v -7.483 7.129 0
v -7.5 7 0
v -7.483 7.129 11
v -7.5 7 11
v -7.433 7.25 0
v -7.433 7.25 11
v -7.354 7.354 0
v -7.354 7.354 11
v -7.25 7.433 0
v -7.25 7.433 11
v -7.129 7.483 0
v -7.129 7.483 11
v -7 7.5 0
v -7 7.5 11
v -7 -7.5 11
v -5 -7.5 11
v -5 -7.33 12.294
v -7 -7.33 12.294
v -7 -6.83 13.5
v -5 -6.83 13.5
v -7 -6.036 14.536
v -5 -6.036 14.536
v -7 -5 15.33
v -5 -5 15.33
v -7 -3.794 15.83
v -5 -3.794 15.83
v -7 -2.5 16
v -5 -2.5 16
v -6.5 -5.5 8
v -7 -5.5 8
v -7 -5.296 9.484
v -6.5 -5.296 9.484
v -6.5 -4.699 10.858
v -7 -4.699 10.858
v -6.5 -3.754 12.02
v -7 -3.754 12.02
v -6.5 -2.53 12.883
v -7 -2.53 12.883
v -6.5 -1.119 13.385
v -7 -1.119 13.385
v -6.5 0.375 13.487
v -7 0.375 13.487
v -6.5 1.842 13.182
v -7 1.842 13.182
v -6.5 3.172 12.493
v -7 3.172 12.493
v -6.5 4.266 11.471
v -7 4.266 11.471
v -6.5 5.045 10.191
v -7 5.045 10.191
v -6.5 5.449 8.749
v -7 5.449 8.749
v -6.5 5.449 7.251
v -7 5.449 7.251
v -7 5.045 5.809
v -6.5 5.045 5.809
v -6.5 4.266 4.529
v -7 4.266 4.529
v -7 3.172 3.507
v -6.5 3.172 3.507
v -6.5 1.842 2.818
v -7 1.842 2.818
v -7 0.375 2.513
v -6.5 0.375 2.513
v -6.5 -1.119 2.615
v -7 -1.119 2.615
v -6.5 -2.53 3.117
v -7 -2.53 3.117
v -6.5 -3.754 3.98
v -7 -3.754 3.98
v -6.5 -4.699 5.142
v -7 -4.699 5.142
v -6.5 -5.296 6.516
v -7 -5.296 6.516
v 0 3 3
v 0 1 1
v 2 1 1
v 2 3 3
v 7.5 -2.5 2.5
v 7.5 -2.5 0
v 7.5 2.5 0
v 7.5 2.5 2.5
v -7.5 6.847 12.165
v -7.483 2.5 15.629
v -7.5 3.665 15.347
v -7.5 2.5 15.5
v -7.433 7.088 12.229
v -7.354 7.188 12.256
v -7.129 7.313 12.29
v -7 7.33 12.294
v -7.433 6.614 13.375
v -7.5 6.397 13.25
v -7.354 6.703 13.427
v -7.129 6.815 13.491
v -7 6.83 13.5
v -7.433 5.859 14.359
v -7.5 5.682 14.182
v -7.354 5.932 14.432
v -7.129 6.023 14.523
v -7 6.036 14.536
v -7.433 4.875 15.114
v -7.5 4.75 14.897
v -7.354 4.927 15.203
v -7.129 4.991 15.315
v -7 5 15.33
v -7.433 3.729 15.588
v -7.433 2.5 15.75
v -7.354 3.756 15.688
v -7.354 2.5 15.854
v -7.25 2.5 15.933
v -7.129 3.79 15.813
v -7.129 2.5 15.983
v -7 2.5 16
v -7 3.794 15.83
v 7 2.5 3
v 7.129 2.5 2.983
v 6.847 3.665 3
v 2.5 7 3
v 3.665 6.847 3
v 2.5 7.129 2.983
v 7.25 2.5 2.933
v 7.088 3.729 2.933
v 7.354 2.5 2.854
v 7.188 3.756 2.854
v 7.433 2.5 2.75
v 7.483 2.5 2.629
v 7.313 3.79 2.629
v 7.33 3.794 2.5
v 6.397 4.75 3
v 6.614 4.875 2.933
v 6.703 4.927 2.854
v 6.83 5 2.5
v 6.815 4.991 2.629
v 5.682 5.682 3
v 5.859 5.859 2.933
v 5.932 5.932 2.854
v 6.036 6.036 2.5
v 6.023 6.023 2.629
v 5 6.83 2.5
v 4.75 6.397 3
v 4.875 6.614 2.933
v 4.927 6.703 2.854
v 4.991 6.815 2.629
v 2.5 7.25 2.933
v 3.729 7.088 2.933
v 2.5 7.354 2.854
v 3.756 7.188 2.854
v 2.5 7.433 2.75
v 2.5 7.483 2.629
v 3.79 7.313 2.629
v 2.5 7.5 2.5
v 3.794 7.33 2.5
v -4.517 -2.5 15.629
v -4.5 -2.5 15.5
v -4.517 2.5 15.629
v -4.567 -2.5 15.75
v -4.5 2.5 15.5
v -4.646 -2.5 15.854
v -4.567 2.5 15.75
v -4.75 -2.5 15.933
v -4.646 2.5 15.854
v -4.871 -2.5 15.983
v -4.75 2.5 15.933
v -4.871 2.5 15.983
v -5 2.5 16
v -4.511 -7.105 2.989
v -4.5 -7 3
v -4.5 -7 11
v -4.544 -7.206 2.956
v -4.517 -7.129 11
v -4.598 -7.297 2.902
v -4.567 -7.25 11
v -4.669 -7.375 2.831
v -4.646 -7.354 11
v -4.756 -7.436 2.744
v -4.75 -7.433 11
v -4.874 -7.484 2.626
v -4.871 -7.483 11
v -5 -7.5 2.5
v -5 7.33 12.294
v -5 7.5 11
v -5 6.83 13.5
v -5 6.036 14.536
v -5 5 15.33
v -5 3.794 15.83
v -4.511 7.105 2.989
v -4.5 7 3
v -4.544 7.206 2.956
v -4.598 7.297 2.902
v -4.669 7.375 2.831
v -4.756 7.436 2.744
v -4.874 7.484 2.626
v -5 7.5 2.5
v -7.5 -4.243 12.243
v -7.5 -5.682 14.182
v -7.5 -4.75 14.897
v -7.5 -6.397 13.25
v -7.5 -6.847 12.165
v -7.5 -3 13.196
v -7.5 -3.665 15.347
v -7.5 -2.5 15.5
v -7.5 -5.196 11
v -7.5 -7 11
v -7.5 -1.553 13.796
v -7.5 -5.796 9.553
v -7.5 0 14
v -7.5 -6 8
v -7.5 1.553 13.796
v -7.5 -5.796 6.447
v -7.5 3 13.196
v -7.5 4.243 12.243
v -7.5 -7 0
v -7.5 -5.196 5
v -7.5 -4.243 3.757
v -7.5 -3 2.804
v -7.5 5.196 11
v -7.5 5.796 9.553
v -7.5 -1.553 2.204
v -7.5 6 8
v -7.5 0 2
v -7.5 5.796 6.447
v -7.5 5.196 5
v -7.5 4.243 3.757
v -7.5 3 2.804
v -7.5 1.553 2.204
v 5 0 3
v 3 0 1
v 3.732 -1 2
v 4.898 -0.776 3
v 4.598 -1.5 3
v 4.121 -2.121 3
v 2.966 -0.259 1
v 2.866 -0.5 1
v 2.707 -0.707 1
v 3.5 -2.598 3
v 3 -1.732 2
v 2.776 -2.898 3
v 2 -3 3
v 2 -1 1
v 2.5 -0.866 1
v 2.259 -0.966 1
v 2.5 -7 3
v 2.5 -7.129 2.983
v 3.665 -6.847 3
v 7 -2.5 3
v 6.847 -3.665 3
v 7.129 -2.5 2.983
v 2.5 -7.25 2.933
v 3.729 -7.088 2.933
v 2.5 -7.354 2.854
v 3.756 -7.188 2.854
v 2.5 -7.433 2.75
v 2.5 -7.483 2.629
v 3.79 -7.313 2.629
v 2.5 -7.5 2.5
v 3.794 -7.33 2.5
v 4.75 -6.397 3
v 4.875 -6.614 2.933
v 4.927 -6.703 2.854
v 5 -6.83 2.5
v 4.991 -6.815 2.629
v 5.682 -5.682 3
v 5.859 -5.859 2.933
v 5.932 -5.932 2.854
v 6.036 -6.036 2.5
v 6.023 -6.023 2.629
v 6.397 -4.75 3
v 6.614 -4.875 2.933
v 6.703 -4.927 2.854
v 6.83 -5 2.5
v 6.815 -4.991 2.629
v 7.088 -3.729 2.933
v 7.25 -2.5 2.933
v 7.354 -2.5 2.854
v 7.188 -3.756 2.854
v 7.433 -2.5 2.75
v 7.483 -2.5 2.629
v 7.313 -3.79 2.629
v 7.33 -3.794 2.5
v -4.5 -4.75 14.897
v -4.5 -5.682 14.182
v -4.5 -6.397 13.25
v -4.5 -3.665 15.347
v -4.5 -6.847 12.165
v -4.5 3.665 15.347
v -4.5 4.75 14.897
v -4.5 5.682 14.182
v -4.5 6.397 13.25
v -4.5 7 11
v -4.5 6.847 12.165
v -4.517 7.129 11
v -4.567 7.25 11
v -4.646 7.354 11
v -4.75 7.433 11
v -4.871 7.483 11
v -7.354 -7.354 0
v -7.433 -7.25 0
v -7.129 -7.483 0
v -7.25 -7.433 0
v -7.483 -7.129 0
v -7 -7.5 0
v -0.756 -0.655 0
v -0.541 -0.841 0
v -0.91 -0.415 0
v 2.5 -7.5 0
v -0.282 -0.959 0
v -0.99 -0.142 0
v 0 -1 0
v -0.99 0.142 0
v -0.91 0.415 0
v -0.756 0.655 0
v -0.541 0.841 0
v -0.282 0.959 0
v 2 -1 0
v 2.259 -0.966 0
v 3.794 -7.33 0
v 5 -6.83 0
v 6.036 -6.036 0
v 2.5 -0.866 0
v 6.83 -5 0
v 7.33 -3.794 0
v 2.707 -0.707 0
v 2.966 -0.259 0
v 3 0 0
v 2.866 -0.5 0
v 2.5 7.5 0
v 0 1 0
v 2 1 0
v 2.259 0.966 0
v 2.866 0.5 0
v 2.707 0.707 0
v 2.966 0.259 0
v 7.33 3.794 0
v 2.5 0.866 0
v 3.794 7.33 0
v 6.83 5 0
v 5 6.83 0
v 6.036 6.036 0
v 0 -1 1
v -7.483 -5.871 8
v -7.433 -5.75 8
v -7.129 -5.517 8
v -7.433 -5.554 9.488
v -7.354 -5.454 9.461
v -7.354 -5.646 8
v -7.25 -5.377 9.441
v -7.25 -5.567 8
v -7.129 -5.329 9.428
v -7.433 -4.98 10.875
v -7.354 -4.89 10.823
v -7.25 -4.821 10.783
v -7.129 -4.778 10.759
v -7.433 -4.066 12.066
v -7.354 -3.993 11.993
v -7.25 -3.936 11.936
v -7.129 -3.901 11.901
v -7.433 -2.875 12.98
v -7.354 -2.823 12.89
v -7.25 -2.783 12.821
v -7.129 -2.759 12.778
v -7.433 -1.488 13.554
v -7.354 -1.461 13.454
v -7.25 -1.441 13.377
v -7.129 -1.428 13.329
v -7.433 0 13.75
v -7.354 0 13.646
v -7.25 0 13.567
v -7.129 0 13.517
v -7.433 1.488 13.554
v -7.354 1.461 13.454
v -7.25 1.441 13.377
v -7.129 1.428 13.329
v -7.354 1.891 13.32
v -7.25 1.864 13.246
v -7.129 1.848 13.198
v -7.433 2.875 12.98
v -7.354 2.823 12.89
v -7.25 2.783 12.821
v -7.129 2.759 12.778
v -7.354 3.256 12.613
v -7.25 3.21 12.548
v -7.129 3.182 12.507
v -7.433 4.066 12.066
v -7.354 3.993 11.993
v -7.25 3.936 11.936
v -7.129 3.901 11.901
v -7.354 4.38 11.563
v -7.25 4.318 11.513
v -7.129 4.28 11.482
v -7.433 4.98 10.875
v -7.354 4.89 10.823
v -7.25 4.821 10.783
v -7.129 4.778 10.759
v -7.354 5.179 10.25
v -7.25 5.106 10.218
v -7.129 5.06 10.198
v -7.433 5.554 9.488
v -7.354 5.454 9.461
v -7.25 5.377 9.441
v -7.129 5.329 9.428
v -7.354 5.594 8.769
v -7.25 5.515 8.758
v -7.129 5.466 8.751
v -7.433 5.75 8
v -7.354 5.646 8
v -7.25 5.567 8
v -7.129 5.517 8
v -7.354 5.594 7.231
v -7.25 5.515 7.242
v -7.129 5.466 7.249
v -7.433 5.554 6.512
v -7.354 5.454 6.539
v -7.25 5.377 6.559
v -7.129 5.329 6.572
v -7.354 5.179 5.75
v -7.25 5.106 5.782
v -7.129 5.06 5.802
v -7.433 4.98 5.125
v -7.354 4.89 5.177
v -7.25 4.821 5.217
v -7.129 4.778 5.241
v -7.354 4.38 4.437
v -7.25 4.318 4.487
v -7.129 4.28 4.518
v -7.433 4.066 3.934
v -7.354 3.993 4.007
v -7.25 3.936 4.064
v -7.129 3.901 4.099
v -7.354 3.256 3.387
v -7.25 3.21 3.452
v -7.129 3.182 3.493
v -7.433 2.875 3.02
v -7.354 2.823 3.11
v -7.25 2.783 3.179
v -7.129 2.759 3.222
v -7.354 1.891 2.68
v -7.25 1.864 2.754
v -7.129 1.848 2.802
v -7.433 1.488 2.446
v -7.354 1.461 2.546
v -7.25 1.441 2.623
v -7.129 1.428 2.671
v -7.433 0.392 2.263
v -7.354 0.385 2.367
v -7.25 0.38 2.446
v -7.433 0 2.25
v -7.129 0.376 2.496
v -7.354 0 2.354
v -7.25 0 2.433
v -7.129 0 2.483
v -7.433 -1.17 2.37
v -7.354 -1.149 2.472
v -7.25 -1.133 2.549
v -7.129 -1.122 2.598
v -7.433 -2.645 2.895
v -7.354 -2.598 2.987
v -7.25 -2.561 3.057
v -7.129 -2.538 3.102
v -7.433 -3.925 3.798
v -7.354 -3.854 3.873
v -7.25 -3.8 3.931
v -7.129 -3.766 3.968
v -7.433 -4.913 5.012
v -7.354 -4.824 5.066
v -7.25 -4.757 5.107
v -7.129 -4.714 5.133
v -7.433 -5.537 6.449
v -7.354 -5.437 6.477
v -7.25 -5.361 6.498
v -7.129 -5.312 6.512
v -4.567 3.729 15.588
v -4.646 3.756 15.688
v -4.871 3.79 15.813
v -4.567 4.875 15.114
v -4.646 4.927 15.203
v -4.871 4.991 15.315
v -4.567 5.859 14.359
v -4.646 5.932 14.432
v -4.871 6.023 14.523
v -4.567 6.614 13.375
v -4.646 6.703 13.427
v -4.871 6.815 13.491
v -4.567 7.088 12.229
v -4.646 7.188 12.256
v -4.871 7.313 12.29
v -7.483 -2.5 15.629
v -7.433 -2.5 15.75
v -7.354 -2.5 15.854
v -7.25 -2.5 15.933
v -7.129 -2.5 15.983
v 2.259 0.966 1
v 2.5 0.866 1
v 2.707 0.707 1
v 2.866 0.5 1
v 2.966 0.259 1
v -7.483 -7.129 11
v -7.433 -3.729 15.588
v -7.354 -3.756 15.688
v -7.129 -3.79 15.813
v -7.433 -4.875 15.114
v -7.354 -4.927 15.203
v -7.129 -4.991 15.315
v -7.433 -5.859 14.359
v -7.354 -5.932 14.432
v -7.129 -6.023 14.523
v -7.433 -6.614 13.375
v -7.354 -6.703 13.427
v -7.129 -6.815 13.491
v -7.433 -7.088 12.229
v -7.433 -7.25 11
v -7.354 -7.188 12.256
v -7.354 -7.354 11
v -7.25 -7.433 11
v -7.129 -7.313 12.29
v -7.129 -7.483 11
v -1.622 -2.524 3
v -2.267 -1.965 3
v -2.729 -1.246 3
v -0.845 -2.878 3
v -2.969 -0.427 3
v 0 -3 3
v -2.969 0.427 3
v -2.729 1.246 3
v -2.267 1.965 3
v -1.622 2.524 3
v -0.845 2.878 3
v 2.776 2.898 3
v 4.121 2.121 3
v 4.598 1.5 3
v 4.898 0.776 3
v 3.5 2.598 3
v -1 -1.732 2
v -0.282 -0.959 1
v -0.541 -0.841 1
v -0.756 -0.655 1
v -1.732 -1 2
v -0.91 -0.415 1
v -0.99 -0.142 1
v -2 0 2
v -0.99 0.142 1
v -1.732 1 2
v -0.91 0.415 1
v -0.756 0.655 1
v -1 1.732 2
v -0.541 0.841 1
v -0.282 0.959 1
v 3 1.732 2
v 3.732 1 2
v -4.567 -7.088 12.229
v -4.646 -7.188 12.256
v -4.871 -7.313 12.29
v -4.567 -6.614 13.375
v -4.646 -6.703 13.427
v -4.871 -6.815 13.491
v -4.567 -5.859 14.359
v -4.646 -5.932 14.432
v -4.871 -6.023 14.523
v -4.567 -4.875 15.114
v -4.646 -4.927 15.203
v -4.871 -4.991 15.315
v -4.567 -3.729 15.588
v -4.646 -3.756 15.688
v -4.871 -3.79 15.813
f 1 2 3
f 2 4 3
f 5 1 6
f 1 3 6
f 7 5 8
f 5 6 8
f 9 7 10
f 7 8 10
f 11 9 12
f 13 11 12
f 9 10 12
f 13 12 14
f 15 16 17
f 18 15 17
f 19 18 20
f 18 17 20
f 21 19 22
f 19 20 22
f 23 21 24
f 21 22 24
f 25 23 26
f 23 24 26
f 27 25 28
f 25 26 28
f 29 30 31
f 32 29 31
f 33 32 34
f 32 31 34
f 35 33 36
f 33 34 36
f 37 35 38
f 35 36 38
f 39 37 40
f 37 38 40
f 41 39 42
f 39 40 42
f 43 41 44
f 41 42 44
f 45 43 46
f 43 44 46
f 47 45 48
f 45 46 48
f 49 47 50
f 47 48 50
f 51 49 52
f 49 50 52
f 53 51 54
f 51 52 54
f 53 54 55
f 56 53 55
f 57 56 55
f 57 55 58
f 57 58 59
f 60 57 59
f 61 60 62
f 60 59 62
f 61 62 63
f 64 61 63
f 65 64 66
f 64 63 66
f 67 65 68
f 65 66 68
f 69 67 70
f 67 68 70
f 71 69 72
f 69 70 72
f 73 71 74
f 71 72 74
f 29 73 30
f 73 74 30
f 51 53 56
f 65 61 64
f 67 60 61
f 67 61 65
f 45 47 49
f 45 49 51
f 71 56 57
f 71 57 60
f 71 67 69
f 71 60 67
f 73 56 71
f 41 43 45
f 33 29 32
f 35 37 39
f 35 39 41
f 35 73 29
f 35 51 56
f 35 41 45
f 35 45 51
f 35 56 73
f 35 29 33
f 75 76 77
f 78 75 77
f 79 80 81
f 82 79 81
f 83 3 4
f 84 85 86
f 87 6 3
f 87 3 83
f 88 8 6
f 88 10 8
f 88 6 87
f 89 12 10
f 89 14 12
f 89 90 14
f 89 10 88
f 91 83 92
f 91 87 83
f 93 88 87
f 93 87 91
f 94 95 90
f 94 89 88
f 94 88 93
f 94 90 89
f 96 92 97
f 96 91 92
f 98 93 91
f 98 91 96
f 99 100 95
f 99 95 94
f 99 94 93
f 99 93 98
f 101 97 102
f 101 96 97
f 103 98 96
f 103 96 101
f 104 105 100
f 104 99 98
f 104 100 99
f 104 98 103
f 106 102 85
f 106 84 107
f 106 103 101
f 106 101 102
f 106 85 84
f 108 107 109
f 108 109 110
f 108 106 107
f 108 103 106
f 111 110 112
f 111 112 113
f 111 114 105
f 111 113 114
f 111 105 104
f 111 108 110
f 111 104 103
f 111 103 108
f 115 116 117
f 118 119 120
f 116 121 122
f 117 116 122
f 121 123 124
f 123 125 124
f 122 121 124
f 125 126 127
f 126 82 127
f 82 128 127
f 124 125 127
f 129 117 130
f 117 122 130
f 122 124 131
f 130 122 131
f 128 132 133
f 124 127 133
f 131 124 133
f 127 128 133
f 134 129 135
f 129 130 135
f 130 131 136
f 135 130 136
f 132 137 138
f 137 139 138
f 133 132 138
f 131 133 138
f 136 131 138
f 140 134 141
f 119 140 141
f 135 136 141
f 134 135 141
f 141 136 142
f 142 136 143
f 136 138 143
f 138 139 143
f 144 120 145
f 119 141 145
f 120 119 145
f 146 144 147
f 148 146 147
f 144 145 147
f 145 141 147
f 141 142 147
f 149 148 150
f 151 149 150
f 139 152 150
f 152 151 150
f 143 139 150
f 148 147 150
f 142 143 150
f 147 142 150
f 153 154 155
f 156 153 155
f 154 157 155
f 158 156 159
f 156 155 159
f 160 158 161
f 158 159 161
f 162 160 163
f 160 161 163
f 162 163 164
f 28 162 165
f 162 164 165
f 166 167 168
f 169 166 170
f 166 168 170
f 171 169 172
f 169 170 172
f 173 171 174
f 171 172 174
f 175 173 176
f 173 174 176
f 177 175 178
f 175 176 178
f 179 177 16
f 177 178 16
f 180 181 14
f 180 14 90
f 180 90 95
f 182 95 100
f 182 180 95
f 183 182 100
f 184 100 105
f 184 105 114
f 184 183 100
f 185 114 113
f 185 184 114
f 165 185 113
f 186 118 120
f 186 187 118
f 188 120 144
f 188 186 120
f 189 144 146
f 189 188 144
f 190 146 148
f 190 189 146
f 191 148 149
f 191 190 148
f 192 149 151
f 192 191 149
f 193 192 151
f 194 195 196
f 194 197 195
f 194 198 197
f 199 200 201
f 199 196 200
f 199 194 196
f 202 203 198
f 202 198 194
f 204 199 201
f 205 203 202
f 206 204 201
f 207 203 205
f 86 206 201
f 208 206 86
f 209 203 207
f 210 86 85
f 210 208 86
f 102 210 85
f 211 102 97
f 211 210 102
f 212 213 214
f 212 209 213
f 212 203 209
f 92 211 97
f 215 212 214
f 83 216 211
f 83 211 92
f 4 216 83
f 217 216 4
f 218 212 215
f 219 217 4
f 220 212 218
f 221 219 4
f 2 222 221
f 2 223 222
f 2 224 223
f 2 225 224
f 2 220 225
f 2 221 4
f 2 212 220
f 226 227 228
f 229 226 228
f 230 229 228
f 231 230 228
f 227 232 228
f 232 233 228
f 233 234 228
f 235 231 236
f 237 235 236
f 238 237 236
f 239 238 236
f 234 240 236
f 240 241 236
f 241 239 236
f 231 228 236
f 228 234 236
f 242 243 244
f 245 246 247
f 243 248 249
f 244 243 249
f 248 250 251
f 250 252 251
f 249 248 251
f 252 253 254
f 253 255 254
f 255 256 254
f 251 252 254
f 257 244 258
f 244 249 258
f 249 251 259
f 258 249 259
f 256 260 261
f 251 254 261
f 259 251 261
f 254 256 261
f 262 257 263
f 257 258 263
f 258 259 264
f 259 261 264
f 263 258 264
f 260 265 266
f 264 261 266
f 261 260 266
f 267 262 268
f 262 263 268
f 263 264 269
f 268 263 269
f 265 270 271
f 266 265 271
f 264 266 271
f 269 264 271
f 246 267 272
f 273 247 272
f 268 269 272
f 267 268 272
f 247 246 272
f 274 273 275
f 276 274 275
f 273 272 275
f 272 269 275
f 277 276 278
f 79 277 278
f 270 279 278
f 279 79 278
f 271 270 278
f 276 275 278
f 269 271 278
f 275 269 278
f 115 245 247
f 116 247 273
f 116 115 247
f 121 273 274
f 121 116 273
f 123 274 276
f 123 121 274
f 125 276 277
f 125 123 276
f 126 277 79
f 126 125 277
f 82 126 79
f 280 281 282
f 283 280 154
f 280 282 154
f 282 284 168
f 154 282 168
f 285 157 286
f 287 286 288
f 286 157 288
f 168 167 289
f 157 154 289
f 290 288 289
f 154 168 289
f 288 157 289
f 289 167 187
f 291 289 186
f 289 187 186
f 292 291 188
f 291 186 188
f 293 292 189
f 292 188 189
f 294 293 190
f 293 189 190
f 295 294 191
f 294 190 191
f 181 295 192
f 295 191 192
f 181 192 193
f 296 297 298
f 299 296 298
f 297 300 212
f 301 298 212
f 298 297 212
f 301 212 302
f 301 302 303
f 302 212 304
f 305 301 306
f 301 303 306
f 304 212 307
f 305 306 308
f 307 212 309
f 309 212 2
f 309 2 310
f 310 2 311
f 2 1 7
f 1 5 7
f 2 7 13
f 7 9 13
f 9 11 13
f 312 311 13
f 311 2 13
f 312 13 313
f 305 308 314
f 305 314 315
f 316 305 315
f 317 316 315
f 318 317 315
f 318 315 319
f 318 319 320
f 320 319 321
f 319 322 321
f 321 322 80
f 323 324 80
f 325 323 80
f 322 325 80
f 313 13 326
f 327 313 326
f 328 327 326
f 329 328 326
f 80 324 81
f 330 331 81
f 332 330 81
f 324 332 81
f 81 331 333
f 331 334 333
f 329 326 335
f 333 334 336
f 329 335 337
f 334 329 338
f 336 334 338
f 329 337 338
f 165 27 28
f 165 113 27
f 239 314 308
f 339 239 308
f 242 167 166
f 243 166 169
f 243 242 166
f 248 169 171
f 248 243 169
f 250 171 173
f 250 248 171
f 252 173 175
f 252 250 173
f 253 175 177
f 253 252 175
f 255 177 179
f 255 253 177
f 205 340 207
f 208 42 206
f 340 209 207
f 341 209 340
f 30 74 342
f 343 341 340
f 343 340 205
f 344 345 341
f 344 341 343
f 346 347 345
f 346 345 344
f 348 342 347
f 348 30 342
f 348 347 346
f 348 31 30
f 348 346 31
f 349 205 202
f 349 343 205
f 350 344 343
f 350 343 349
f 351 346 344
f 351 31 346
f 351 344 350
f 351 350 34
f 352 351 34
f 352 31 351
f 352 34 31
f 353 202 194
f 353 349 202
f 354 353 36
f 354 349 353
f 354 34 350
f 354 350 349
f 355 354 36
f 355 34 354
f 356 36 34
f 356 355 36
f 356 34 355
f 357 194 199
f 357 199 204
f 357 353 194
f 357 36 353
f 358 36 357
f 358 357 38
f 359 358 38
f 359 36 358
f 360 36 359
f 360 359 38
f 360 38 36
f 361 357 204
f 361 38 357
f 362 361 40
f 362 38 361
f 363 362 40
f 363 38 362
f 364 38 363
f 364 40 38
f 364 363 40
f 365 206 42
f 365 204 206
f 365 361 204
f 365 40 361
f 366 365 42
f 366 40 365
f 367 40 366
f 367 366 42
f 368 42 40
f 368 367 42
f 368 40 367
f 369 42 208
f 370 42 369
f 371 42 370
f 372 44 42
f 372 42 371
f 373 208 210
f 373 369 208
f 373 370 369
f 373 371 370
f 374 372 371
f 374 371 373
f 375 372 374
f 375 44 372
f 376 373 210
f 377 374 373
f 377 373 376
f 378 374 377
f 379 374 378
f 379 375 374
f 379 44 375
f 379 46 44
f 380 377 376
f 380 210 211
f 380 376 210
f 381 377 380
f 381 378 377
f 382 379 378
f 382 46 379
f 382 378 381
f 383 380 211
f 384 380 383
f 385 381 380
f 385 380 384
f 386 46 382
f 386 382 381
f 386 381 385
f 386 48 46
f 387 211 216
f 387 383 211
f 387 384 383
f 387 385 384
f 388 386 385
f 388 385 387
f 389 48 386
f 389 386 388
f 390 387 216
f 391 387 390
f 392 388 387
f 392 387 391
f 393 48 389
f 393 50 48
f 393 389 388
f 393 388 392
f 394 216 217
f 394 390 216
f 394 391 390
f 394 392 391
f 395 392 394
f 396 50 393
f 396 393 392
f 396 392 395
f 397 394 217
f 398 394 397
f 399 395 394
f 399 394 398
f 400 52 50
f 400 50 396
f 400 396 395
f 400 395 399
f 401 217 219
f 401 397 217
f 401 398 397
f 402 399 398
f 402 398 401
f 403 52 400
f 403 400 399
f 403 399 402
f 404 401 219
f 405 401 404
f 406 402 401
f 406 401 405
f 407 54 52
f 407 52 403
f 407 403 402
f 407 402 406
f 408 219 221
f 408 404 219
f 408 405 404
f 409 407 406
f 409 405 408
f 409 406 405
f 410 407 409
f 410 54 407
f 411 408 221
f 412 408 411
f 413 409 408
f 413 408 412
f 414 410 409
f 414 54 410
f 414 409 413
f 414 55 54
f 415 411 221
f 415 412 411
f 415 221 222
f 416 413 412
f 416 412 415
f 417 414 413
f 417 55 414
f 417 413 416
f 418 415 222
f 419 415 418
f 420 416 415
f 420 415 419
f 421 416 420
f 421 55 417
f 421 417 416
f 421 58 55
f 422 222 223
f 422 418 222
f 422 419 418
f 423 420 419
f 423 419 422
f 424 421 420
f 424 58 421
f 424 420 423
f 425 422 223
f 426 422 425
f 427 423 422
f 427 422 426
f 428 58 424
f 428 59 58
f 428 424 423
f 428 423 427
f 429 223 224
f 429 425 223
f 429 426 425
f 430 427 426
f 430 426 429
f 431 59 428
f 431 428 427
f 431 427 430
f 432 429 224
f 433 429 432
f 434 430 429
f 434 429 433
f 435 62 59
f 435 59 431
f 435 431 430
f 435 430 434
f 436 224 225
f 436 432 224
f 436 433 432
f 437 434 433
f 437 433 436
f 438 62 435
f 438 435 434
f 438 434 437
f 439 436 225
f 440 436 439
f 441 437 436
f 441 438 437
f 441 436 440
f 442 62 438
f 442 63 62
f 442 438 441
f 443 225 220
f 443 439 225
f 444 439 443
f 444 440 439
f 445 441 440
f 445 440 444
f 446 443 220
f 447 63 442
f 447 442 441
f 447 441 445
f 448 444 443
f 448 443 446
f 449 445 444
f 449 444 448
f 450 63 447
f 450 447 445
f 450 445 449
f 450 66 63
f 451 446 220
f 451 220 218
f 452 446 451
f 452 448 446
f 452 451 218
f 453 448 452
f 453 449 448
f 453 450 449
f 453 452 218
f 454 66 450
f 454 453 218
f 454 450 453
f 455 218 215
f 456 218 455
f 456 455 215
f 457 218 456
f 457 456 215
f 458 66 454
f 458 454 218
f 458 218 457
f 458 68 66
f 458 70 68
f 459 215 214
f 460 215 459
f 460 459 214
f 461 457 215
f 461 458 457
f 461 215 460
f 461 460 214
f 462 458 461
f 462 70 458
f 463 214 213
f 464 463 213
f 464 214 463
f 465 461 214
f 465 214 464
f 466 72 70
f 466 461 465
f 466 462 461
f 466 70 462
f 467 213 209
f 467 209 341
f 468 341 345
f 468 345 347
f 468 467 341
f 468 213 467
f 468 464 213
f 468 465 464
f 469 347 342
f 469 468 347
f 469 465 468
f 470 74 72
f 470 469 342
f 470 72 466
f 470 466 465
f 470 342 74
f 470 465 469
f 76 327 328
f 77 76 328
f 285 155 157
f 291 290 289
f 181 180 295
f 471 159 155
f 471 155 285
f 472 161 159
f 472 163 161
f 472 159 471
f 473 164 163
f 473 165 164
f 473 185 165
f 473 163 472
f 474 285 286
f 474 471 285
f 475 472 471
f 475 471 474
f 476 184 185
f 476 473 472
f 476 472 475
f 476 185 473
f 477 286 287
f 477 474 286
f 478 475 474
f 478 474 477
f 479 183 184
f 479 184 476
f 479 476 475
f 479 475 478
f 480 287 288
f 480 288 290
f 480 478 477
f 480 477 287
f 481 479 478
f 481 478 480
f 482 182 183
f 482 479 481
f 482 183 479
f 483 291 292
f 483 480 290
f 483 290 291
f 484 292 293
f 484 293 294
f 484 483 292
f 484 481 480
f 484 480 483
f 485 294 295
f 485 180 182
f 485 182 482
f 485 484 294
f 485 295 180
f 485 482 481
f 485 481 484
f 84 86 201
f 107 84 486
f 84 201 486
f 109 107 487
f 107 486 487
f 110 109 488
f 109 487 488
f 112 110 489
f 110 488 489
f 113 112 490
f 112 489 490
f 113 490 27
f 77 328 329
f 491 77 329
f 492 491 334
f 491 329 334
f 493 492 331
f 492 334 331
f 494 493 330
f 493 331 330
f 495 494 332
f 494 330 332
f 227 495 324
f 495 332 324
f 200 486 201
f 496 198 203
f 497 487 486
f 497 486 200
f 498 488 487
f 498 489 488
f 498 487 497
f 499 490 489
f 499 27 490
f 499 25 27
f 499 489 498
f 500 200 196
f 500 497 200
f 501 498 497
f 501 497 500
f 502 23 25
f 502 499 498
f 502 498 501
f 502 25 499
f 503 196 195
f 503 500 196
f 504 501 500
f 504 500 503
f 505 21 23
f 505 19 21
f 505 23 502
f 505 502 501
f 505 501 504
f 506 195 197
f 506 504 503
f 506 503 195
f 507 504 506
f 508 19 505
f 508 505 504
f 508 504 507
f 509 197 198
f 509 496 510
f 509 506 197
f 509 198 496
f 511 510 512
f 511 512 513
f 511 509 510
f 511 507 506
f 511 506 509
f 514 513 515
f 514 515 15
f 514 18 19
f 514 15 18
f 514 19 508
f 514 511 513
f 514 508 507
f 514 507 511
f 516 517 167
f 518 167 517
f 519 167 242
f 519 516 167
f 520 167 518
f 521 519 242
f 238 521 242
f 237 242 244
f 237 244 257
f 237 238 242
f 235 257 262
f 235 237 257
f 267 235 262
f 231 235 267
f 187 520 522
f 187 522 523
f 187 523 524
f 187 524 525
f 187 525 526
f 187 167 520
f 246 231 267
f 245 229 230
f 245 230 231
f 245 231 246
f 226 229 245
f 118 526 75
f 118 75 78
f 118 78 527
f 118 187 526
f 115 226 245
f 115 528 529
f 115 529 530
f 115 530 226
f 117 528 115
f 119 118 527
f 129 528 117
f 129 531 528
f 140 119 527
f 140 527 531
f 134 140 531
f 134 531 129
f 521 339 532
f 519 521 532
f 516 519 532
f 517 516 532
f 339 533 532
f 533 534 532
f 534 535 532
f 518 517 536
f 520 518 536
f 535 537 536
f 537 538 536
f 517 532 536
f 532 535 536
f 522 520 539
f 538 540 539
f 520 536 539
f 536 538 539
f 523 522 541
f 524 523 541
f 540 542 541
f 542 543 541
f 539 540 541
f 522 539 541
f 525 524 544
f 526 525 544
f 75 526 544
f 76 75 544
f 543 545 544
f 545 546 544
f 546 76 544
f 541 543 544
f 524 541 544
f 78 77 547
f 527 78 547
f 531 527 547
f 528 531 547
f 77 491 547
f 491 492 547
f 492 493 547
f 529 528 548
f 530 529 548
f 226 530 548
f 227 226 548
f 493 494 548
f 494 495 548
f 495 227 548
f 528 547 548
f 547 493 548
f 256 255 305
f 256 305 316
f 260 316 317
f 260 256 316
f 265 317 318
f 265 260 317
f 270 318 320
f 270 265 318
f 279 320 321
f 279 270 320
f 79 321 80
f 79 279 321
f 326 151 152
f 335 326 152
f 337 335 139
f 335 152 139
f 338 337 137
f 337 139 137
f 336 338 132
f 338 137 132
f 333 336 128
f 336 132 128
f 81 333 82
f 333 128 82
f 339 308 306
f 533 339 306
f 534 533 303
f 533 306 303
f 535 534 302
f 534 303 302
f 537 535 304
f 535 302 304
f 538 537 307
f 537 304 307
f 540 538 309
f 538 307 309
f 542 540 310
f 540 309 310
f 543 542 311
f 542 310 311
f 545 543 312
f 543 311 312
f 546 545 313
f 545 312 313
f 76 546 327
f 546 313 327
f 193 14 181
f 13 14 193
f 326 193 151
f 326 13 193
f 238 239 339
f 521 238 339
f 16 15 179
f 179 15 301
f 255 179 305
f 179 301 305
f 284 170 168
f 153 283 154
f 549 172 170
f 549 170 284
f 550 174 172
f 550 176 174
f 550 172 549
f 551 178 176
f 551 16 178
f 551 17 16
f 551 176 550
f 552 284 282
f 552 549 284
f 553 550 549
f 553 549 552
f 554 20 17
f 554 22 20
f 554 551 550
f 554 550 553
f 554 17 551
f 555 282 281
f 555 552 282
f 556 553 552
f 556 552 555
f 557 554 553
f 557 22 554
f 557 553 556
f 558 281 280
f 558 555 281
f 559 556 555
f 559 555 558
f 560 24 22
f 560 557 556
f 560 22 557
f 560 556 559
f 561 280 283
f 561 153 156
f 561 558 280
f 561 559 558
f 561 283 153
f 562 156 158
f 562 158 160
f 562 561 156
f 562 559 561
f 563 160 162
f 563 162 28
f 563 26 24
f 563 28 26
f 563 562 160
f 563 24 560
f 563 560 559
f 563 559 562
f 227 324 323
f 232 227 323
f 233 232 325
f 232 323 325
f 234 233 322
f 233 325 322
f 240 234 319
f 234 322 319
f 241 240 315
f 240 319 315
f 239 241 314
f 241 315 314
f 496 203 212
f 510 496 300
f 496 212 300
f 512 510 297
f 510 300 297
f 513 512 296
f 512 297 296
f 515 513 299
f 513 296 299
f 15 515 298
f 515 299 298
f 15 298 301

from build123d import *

# Parameters (mm, degrees)
F0_W     = 3
F0_H     = 15
F1_DEPTH = 16
F0_W_2   = 12
F2_DEPTH = 3
F3_R     = 5.5
F4_DEPTH = 1
F5_SIZE  = 2
F6_R     = 5
F7_R     = 0.5


with BuildPart() as f1:
    # F0 (on Top) → F1 (new body)
    with BuildSketch(Plane.XY):
        with Locations((-6, 0)):
            Rectangle(F0_W, F0_H)
    extrude(amount=F1_DEPTH)

    # F0 (on Top) → F2 (join)
    with BuildSketch(Plane.XY):
        with Locations((1.5, 0)):
            Rectangle(F0_W_2, F0_H)
        with BuildLine():
            ThreePointArc((0, -1), (-1, 0), (0, 1))
            Line((0, 1), (2, 1))
            ThreePointArc((2, 1), (2.7071067812, 0.7071067812), (3, 0))
            ThreePointArc((3, 0), (2.7071067812, -0.7071067812), (2, -1))
            Line((2, -1), (0, -1))
        make_face(mode=Mode.SUBTRACT)
    extrude(amount=F2_DEPTH)

    # F3 (on face) → F4 (cut)
    with BuildSketch(Plane(origin=(-7.5, 0, 0), x_dir=(0, -1, 0), z_dir=(-1, 0, 0))):
        with Locations((0, 8)):
            Circle(F3_R)
    extrude(amount=-F4_DEPTH, mode=Mode.SUBTRACT)

    # F5
    f5_edges = [f1.edges().sort_by_distance(p)[0] for p in [
        (-1, 0, 3),
    ]]
    chamfer(f5_edges, length=F5_SIZE)

    # F6
    f6_edges = [f1.edges().sort_by_distance(p)[0] for p in [
        (-6, -7.5, 16),
        (-6, 7.5, 16),
        (7.5, -7.5, 1.5),
        (7.5, 7.5, 1.5),
    ]]
    fillet(f6_edges, radius=F6_R)

    # F7
    f7_edges = [f1.edges().sort_by_distance(p)[0] for p in [
        (-7.5, 5.5, 8),
        (-7.5, 6.035534, 14.535534),
        (-4.5, -6.035534, 14.535534),
        (6.035534, -6.035534, 3),
    ]]
    fillet(f7_edges, radius=F7_R)


solid = f1.part
